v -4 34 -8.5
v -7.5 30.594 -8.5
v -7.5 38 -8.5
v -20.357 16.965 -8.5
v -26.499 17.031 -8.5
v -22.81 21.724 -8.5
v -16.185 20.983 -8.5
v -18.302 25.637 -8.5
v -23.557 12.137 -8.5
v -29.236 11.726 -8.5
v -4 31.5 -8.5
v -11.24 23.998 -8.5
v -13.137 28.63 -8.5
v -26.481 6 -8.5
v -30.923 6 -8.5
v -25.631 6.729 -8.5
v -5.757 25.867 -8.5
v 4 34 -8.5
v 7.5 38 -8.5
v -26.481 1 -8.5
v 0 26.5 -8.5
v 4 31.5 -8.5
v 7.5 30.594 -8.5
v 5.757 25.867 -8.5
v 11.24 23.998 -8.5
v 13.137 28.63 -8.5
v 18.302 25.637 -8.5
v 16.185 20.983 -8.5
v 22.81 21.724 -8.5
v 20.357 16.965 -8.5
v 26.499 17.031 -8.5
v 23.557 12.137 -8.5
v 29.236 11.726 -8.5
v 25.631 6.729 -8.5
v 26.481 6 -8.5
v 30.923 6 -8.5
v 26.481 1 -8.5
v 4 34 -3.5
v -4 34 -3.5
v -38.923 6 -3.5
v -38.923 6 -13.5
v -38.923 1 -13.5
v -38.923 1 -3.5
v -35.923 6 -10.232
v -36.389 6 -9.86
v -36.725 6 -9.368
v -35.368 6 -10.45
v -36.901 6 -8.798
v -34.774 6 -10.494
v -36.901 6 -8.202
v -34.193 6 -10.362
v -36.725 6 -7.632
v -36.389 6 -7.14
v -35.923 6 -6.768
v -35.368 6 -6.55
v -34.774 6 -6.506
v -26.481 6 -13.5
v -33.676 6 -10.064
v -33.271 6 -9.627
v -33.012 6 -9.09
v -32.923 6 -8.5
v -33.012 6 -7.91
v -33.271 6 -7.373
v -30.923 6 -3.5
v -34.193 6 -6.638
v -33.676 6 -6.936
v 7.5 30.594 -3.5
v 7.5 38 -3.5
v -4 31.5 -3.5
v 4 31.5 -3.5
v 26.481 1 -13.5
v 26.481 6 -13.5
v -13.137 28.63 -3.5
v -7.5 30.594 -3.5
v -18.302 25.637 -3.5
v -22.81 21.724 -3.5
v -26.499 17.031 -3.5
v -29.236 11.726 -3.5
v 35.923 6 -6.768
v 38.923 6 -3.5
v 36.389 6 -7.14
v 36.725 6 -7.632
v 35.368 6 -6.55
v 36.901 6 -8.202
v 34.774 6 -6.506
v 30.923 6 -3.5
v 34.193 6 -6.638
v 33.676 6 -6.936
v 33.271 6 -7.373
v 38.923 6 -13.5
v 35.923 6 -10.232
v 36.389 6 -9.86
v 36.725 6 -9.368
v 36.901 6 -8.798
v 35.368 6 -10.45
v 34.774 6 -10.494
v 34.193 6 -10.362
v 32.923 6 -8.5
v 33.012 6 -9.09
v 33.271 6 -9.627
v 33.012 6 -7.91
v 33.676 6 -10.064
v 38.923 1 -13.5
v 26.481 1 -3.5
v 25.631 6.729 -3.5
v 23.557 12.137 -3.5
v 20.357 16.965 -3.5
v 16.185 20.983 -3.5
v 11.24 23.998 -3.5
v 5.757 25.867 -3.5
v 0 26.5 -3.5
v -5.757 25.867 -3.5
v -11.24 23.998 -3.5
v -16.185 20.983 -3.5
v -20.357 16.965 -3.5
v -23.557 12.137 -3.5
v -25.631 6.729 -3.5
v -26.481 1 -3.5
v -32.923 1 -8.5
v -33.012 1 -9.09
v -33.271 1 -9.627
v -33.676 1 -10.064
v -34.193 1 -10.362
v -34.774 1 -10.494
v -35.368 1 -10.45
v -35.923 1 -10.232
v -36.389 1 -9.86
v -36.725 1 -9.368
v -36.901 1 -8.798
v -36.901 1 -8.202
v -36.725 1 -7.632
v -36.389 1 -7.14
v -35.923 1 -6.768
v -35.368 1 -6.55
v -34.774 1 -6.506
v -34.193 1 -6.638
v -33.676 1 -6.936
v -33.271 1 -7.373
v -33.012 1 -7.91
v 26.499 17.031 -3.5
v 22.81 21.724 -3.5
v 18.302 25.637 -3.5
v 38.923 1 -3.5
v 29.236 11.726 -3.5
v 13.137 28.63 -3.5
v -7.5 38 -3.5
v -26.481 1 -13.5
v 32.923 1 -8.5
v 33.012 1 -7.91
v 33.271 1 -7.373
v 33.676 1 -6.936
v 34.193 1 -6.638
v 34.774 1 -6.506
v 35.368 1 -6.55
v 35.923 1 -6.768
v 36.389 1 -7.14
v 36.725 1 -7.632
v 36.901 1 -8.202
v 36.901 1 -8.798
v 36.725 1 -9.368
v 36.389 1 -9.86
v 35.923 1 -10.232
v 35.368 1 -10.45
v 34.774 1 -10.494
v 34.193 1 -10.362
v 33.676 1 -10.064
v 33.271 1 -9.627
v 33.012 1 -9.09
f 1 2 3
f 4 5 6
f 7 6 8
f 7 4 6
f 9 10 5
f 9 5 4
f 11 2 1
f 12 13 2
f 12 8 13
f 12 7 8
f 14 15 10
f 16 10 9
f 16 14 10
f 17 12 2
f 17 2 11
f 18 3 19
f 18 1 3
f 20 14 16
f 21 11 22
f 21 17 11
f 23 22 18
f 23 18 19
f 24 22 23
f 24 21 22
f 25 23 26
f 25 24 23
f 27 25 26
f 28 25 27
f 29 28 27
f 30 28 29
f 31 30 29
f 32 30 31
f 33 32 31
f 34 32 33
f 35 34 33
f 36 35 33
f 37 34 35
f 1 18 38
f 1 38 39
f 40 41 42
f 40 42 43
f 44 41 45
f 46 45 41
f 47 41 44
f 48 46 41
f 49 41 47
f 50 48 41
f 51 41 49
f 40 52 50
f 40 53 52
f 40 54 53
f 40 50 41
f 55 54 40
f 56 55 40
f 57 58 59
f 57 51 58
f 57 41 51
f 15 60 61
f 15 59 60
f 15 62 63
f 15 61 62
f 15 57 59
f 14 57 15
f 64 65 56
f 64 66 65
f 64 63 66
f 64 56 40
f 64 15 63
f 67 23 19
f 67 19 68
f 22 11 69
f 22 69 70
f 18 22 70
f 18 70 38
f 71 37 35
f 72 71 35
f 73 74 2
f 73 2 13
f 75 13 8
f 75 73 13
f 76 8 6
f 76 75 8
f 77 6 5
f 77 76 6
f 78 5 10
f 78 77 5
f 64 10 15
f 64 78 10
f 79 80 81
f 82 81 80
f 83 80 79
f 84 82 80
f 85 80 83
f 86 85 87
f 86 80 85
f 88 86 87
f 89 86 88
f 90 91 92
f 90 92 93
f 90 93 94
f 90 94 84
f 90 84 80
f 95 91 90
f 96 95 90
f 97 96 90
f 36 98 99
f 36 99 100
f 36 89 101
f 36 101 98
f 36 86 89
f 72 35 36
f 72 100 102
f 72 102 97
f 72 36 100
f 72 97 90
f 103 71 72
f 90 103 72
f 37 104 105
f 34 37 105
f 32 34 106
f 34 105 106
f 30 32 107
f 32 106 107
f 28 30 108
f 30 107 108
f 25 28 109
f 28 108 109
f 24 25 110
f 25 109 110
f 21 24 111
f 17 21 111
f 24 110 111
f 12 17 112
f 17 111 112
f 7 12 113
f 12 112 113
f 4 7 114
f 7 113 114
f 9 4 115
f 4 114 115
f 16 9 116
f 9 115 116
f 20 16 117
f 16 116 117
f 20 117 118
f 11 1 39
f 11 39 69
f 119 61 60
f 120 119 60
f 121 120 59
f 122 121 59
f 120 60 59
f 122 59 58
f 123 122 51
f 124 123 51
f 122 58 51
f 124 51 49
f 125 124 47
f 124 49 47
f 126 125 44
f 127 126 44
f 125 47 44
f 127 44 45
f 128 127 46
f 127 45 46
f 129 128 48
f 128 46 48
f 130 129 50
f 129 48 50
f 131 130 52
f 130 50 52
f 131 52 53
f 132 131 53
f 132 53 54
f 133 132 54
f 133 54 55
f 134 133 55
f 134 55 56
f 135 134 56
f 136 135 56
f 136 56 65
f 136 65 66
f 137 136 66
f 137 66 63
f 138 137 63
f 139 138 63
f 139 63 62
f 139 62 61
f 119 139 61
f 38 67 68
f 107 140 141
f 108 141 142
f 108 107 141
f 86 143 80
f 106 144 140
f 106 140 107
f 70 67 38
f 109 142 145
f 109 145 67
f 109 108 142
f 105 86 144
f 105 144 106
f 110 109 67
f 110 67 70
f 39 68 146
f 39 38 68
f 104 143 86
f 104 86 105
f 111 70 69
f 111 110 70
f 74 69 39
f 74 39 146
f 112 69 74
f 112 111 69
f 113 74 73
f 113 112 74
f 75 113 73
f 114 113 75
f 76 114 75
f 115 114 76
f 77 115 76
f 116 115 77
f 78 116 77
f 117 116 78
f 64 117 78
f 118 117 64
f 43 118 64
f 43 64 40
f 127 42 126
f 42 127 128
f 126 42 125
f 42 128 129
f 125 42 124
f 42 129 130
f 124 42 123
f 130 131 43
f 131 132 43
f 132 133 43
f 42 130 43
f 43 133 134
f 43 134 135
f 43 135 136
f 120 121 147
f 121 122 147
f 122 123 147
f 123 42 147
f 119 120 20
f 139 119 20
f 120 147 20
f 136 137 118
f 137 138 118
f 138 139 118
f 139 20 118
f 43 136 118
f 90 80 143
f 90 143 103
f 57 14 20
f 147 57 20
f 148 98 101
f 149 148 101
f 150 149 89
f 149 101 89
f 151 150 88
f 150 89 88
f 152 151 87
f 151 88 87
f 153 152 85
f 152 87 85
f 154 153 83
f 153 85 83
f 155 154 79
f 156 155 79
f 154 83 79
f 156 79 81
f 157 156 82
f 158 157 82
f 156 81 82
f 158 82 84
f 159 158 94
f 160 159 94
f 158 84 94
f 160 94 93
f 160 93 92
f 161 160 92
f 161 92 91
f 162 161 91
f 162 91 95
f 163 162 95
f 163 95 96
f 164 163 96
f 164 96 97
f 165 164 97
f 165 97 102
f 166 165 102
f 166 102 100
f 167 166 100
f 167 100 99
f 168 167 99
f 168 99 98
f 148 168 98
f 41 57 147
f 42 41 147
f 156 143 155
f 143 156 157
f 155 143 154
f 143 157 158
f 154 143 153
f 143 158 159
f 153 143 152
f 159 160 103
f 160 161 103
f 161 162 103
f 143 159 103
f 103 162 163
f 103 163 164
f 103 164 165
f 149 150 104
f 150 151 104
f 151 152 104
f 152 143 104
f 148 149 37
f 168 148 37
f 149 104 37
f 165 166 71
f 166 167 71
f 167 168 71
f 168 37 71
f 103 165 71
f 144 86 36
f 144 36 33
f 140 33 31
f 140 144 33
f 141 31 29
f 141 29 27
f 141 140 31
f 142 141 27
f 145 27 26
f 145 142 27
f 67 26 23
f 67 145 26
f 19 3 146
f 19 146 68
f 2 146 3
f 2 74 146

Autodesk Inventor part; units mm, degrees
ref_plane "YZ Plane" through (0, 0, 0) normal (1, 0, 0) x (0, 1, 0)
ref_plane "Work Plane1" through (0, 0, -3.5) normal (0, 0, 1) x (1, 0, 0)
sketch "Sketch1" plane through (0, 0, -3.5) normal (0, 0, 1) x (1, 0, 0)
  circle A0 centre (0, 0) radius 26.5 projected
  circle A1 centre (0, 0) radius 31.5
  point P0 (0, 0)
  dimension "d1" = 5
extrude "Extrusion1" add sketch "Sketch1" against normal blind 5
sketch "Sketch5" plane through (0, 0, 0) normal (1, 0, 0) x (0, 1, 0)
  line L0 (6.0883, 0) -> (4.0883, 0)
  line L1 (4.0883, 0) -> (4.0883, -15.2563)
  line L2 (4.0883, -15.2563) -> (6.0883, -15.2563)
  line L3 (6.0883, -15.2563) -> (6.0883, 0)
  line L4 (-1, 2.6587) -> (1, 2.6587)
  line L5 (1, 2.6587) -> (1, -12.1151)
  line L6 (1, -12.1151) -> (-1, -12.1151)
  line L7 (-1, -12.1151) -> (-1, 2.6587)
  point P0 (0, 0)
  dimension "d4" = 2
  dimension "d5" = 2
  dimension "d6" = 1
extrude "Extrusion2" cut sketch "Sketch5" along normal through all both and the other way through all contours L4 L5 L6 L7
sketch "Sketch6" plane through (0, 0, -8.5) normal (0, 0, -1) x (-1, 0, 0)
  line L0 (26.4811, 1) -> (31.4841, 1) projected
  line L1 (-31.4841, 1) -> (-26.4811, 1) projected
  arc A0 (26.4811, 1) -> (-26.4811, 1) centre (0, 0) ccw projected
  line L2 (26.4811, 1) -> (31.4841, 1) projected
  arc A1 (31.4841, 1) -> (-31.4841, 1) centre (0, 0) ccw projected
  line L3 (-53.7275, 6) -> (74.5535, 6)
  line L4 (26.4811, 1) -> (30.9233, 1)
  line L5 (30.9233, 1) -> (30.9233, 6)
  line L6 (30.9233, 6) -> (26.4811, 6)
  line L7 (26.4811, 6) -> (26.4811, 1)
  dimension "d9" = 5
extrude "Extrusion3" add sketch "Sketch6" along normal blind 5 contours L7 L3 L5 L0
sketch "Sketch7" plane through (-30.9233, 1, -8.5) normal (-1, 0, 0) x (0, 0, 1)
  line L0 (0, 5) -> (0, 0) projected
  line L1 (0, 5) -> (-5, 5) projected
  line L2 (-5, 0) -> (-5, 5) projected
  line L3 (0, 0) -> (-5, 0) projected
  point P0 (8.5, -1)
extrude "Extrusion4" add sketch "Sketch7" along normal blind 5
sketch "Sketch8" plane through (-35.9233, 6, -8.5) normal (0, 0, 1) x (1, 0, 0)
  arc A0 (5, 0) -> (4.4392, -5) centre (35.9233, -6) ccw projected
  line L0 (5, 0) -> (0, 0) projected
  line L1 (0, -5) -> (0, 0) projected
  line L2 (4.4392, -5) -> (0, -5) projected
extrude "Extrusion5" add sketch "Sketch8" along normal blind 5
sketch "Sketch9" plane through (-35.9233, 1, -8.5) normal (-1, 0, 0) x (0, 0, 1)
  line L0 (-5, 5) -> (5, 5) projected
  line L1 (-5, 5) -> (-5, 0) projected
  line L2 (-5, 0) -> (5, 0) projected
  line L3 (5, 5) -> (5, 0) projected
  point P0 (8.5, -1)
extrude "Extrusion6" add sketch "Sketch9" along normal blind 3
sketch "Sketch10" plane through (-30.9233, 6, -8.5) normal (0, 1, 0) x (1, 0, 0)
  circle A0 centre (-4, 0) radius 2
  point P0 (30.9233, -8.5)
  dimension "d18" = 4
extrude "Extrusion7" cut sketch "Sketch10" against normal up to next
mirror "Mirror1" about plane through (0, 0, 0) normal (1, 0, 0) of "Extrusion3", "Extrusion4", "Extrusion5", "Extrusion6", "Extrusion7"
sketch "Sketch11" plane through (0, 0, -8.5) normal (0, 0, -1) x (-1, 0, 0)
  line L0 (31.4841, -1) -> (26.4811, -1) projected
  arc A0 (-26.4811, -1) -> (26.4811, -1) centre (0, 0) ccw projected
  line L1 (-26.4811, -1) -> (-31.4841, -1) projected
  arc A1 (-31.4841, -1) -> (31.4841, -1) centre (0, 0) ccw projected
extrude "Extrusion8" cut sketch "Sketch11" against normal through all
ref_plane "Work Plane2" through (0, 35, 0) normal (0, 1, 0) x (-1, 0, 0)
sketch "Sketch12" plane through (0, 35, 0) normal (0, 1, 0) x (-1, 0, 0)
  line L0 (-30.9233, -3.5) -> (30.9233, -3.5) construction
  line L1 (-30.9233, -8.5) -> (30.9233, -8.5) construction
  line L2 (-7.5, -3.5) -> (7.5, -3.5)
  line L3 (7.5, -3.5) -> (7.5, -8.5)
  line L4 (7.5, -8.5) -> (-7.5, -8.5)
  line L5 (-7.5, -8.5) -> (-7.5, -3.5)
  point P0 (0, 0)
  dimension "d24" = 15
  dimension "d25" = 7.5
extrude "Extrusion9" add sketch "Sketch12" against normal up to next
sketch "Sketch13" plane through (0, 35, 0) normal (0, 1, 0) x (1, 0, 0)
  line L0 (7.5, 3.5) -> (-7.5, 3.5) projected
  line L1 (7.5, 8.5) -> (7.5, 3.5) projected
  line L2 (-7.5, 8.5) -> (7.5, 8.5) projected
  line L3 (-7.5, 3.5) -> (-7.5, 8.5) projected
  point P0 (0, 0)
extrude "Extrusion10" add sketch "Sketch13" along normal blind 3
sketch "Sketch14" plane through (0, 0, -8.5) normal (0, 0, -1) x (-1, 0, 0)
  line L0 (-7.5, 38) -> (7.5, 38) projected
  arc A0 (-7.5, 30.5941) -> (-30.9233, 6) centre (0, 0) ccw projected
  line L1 (-4, 34) -> (4, 34)
  line L2 (4, 34) -> (4, 31.5)
  line L3 (4, 31.5) -> (-4, 31.5)
  line L4 (-4, 31.5) -> (-4, 34)
  dimension "d30" = 8
  dimension "d31" = 2.5
  dimension "d32" = 4
  dimension "d33" = 4
extrude "Extrusion11" cut sketch "Sketch14" against normal blind 5
properties part number "CanBracket"
